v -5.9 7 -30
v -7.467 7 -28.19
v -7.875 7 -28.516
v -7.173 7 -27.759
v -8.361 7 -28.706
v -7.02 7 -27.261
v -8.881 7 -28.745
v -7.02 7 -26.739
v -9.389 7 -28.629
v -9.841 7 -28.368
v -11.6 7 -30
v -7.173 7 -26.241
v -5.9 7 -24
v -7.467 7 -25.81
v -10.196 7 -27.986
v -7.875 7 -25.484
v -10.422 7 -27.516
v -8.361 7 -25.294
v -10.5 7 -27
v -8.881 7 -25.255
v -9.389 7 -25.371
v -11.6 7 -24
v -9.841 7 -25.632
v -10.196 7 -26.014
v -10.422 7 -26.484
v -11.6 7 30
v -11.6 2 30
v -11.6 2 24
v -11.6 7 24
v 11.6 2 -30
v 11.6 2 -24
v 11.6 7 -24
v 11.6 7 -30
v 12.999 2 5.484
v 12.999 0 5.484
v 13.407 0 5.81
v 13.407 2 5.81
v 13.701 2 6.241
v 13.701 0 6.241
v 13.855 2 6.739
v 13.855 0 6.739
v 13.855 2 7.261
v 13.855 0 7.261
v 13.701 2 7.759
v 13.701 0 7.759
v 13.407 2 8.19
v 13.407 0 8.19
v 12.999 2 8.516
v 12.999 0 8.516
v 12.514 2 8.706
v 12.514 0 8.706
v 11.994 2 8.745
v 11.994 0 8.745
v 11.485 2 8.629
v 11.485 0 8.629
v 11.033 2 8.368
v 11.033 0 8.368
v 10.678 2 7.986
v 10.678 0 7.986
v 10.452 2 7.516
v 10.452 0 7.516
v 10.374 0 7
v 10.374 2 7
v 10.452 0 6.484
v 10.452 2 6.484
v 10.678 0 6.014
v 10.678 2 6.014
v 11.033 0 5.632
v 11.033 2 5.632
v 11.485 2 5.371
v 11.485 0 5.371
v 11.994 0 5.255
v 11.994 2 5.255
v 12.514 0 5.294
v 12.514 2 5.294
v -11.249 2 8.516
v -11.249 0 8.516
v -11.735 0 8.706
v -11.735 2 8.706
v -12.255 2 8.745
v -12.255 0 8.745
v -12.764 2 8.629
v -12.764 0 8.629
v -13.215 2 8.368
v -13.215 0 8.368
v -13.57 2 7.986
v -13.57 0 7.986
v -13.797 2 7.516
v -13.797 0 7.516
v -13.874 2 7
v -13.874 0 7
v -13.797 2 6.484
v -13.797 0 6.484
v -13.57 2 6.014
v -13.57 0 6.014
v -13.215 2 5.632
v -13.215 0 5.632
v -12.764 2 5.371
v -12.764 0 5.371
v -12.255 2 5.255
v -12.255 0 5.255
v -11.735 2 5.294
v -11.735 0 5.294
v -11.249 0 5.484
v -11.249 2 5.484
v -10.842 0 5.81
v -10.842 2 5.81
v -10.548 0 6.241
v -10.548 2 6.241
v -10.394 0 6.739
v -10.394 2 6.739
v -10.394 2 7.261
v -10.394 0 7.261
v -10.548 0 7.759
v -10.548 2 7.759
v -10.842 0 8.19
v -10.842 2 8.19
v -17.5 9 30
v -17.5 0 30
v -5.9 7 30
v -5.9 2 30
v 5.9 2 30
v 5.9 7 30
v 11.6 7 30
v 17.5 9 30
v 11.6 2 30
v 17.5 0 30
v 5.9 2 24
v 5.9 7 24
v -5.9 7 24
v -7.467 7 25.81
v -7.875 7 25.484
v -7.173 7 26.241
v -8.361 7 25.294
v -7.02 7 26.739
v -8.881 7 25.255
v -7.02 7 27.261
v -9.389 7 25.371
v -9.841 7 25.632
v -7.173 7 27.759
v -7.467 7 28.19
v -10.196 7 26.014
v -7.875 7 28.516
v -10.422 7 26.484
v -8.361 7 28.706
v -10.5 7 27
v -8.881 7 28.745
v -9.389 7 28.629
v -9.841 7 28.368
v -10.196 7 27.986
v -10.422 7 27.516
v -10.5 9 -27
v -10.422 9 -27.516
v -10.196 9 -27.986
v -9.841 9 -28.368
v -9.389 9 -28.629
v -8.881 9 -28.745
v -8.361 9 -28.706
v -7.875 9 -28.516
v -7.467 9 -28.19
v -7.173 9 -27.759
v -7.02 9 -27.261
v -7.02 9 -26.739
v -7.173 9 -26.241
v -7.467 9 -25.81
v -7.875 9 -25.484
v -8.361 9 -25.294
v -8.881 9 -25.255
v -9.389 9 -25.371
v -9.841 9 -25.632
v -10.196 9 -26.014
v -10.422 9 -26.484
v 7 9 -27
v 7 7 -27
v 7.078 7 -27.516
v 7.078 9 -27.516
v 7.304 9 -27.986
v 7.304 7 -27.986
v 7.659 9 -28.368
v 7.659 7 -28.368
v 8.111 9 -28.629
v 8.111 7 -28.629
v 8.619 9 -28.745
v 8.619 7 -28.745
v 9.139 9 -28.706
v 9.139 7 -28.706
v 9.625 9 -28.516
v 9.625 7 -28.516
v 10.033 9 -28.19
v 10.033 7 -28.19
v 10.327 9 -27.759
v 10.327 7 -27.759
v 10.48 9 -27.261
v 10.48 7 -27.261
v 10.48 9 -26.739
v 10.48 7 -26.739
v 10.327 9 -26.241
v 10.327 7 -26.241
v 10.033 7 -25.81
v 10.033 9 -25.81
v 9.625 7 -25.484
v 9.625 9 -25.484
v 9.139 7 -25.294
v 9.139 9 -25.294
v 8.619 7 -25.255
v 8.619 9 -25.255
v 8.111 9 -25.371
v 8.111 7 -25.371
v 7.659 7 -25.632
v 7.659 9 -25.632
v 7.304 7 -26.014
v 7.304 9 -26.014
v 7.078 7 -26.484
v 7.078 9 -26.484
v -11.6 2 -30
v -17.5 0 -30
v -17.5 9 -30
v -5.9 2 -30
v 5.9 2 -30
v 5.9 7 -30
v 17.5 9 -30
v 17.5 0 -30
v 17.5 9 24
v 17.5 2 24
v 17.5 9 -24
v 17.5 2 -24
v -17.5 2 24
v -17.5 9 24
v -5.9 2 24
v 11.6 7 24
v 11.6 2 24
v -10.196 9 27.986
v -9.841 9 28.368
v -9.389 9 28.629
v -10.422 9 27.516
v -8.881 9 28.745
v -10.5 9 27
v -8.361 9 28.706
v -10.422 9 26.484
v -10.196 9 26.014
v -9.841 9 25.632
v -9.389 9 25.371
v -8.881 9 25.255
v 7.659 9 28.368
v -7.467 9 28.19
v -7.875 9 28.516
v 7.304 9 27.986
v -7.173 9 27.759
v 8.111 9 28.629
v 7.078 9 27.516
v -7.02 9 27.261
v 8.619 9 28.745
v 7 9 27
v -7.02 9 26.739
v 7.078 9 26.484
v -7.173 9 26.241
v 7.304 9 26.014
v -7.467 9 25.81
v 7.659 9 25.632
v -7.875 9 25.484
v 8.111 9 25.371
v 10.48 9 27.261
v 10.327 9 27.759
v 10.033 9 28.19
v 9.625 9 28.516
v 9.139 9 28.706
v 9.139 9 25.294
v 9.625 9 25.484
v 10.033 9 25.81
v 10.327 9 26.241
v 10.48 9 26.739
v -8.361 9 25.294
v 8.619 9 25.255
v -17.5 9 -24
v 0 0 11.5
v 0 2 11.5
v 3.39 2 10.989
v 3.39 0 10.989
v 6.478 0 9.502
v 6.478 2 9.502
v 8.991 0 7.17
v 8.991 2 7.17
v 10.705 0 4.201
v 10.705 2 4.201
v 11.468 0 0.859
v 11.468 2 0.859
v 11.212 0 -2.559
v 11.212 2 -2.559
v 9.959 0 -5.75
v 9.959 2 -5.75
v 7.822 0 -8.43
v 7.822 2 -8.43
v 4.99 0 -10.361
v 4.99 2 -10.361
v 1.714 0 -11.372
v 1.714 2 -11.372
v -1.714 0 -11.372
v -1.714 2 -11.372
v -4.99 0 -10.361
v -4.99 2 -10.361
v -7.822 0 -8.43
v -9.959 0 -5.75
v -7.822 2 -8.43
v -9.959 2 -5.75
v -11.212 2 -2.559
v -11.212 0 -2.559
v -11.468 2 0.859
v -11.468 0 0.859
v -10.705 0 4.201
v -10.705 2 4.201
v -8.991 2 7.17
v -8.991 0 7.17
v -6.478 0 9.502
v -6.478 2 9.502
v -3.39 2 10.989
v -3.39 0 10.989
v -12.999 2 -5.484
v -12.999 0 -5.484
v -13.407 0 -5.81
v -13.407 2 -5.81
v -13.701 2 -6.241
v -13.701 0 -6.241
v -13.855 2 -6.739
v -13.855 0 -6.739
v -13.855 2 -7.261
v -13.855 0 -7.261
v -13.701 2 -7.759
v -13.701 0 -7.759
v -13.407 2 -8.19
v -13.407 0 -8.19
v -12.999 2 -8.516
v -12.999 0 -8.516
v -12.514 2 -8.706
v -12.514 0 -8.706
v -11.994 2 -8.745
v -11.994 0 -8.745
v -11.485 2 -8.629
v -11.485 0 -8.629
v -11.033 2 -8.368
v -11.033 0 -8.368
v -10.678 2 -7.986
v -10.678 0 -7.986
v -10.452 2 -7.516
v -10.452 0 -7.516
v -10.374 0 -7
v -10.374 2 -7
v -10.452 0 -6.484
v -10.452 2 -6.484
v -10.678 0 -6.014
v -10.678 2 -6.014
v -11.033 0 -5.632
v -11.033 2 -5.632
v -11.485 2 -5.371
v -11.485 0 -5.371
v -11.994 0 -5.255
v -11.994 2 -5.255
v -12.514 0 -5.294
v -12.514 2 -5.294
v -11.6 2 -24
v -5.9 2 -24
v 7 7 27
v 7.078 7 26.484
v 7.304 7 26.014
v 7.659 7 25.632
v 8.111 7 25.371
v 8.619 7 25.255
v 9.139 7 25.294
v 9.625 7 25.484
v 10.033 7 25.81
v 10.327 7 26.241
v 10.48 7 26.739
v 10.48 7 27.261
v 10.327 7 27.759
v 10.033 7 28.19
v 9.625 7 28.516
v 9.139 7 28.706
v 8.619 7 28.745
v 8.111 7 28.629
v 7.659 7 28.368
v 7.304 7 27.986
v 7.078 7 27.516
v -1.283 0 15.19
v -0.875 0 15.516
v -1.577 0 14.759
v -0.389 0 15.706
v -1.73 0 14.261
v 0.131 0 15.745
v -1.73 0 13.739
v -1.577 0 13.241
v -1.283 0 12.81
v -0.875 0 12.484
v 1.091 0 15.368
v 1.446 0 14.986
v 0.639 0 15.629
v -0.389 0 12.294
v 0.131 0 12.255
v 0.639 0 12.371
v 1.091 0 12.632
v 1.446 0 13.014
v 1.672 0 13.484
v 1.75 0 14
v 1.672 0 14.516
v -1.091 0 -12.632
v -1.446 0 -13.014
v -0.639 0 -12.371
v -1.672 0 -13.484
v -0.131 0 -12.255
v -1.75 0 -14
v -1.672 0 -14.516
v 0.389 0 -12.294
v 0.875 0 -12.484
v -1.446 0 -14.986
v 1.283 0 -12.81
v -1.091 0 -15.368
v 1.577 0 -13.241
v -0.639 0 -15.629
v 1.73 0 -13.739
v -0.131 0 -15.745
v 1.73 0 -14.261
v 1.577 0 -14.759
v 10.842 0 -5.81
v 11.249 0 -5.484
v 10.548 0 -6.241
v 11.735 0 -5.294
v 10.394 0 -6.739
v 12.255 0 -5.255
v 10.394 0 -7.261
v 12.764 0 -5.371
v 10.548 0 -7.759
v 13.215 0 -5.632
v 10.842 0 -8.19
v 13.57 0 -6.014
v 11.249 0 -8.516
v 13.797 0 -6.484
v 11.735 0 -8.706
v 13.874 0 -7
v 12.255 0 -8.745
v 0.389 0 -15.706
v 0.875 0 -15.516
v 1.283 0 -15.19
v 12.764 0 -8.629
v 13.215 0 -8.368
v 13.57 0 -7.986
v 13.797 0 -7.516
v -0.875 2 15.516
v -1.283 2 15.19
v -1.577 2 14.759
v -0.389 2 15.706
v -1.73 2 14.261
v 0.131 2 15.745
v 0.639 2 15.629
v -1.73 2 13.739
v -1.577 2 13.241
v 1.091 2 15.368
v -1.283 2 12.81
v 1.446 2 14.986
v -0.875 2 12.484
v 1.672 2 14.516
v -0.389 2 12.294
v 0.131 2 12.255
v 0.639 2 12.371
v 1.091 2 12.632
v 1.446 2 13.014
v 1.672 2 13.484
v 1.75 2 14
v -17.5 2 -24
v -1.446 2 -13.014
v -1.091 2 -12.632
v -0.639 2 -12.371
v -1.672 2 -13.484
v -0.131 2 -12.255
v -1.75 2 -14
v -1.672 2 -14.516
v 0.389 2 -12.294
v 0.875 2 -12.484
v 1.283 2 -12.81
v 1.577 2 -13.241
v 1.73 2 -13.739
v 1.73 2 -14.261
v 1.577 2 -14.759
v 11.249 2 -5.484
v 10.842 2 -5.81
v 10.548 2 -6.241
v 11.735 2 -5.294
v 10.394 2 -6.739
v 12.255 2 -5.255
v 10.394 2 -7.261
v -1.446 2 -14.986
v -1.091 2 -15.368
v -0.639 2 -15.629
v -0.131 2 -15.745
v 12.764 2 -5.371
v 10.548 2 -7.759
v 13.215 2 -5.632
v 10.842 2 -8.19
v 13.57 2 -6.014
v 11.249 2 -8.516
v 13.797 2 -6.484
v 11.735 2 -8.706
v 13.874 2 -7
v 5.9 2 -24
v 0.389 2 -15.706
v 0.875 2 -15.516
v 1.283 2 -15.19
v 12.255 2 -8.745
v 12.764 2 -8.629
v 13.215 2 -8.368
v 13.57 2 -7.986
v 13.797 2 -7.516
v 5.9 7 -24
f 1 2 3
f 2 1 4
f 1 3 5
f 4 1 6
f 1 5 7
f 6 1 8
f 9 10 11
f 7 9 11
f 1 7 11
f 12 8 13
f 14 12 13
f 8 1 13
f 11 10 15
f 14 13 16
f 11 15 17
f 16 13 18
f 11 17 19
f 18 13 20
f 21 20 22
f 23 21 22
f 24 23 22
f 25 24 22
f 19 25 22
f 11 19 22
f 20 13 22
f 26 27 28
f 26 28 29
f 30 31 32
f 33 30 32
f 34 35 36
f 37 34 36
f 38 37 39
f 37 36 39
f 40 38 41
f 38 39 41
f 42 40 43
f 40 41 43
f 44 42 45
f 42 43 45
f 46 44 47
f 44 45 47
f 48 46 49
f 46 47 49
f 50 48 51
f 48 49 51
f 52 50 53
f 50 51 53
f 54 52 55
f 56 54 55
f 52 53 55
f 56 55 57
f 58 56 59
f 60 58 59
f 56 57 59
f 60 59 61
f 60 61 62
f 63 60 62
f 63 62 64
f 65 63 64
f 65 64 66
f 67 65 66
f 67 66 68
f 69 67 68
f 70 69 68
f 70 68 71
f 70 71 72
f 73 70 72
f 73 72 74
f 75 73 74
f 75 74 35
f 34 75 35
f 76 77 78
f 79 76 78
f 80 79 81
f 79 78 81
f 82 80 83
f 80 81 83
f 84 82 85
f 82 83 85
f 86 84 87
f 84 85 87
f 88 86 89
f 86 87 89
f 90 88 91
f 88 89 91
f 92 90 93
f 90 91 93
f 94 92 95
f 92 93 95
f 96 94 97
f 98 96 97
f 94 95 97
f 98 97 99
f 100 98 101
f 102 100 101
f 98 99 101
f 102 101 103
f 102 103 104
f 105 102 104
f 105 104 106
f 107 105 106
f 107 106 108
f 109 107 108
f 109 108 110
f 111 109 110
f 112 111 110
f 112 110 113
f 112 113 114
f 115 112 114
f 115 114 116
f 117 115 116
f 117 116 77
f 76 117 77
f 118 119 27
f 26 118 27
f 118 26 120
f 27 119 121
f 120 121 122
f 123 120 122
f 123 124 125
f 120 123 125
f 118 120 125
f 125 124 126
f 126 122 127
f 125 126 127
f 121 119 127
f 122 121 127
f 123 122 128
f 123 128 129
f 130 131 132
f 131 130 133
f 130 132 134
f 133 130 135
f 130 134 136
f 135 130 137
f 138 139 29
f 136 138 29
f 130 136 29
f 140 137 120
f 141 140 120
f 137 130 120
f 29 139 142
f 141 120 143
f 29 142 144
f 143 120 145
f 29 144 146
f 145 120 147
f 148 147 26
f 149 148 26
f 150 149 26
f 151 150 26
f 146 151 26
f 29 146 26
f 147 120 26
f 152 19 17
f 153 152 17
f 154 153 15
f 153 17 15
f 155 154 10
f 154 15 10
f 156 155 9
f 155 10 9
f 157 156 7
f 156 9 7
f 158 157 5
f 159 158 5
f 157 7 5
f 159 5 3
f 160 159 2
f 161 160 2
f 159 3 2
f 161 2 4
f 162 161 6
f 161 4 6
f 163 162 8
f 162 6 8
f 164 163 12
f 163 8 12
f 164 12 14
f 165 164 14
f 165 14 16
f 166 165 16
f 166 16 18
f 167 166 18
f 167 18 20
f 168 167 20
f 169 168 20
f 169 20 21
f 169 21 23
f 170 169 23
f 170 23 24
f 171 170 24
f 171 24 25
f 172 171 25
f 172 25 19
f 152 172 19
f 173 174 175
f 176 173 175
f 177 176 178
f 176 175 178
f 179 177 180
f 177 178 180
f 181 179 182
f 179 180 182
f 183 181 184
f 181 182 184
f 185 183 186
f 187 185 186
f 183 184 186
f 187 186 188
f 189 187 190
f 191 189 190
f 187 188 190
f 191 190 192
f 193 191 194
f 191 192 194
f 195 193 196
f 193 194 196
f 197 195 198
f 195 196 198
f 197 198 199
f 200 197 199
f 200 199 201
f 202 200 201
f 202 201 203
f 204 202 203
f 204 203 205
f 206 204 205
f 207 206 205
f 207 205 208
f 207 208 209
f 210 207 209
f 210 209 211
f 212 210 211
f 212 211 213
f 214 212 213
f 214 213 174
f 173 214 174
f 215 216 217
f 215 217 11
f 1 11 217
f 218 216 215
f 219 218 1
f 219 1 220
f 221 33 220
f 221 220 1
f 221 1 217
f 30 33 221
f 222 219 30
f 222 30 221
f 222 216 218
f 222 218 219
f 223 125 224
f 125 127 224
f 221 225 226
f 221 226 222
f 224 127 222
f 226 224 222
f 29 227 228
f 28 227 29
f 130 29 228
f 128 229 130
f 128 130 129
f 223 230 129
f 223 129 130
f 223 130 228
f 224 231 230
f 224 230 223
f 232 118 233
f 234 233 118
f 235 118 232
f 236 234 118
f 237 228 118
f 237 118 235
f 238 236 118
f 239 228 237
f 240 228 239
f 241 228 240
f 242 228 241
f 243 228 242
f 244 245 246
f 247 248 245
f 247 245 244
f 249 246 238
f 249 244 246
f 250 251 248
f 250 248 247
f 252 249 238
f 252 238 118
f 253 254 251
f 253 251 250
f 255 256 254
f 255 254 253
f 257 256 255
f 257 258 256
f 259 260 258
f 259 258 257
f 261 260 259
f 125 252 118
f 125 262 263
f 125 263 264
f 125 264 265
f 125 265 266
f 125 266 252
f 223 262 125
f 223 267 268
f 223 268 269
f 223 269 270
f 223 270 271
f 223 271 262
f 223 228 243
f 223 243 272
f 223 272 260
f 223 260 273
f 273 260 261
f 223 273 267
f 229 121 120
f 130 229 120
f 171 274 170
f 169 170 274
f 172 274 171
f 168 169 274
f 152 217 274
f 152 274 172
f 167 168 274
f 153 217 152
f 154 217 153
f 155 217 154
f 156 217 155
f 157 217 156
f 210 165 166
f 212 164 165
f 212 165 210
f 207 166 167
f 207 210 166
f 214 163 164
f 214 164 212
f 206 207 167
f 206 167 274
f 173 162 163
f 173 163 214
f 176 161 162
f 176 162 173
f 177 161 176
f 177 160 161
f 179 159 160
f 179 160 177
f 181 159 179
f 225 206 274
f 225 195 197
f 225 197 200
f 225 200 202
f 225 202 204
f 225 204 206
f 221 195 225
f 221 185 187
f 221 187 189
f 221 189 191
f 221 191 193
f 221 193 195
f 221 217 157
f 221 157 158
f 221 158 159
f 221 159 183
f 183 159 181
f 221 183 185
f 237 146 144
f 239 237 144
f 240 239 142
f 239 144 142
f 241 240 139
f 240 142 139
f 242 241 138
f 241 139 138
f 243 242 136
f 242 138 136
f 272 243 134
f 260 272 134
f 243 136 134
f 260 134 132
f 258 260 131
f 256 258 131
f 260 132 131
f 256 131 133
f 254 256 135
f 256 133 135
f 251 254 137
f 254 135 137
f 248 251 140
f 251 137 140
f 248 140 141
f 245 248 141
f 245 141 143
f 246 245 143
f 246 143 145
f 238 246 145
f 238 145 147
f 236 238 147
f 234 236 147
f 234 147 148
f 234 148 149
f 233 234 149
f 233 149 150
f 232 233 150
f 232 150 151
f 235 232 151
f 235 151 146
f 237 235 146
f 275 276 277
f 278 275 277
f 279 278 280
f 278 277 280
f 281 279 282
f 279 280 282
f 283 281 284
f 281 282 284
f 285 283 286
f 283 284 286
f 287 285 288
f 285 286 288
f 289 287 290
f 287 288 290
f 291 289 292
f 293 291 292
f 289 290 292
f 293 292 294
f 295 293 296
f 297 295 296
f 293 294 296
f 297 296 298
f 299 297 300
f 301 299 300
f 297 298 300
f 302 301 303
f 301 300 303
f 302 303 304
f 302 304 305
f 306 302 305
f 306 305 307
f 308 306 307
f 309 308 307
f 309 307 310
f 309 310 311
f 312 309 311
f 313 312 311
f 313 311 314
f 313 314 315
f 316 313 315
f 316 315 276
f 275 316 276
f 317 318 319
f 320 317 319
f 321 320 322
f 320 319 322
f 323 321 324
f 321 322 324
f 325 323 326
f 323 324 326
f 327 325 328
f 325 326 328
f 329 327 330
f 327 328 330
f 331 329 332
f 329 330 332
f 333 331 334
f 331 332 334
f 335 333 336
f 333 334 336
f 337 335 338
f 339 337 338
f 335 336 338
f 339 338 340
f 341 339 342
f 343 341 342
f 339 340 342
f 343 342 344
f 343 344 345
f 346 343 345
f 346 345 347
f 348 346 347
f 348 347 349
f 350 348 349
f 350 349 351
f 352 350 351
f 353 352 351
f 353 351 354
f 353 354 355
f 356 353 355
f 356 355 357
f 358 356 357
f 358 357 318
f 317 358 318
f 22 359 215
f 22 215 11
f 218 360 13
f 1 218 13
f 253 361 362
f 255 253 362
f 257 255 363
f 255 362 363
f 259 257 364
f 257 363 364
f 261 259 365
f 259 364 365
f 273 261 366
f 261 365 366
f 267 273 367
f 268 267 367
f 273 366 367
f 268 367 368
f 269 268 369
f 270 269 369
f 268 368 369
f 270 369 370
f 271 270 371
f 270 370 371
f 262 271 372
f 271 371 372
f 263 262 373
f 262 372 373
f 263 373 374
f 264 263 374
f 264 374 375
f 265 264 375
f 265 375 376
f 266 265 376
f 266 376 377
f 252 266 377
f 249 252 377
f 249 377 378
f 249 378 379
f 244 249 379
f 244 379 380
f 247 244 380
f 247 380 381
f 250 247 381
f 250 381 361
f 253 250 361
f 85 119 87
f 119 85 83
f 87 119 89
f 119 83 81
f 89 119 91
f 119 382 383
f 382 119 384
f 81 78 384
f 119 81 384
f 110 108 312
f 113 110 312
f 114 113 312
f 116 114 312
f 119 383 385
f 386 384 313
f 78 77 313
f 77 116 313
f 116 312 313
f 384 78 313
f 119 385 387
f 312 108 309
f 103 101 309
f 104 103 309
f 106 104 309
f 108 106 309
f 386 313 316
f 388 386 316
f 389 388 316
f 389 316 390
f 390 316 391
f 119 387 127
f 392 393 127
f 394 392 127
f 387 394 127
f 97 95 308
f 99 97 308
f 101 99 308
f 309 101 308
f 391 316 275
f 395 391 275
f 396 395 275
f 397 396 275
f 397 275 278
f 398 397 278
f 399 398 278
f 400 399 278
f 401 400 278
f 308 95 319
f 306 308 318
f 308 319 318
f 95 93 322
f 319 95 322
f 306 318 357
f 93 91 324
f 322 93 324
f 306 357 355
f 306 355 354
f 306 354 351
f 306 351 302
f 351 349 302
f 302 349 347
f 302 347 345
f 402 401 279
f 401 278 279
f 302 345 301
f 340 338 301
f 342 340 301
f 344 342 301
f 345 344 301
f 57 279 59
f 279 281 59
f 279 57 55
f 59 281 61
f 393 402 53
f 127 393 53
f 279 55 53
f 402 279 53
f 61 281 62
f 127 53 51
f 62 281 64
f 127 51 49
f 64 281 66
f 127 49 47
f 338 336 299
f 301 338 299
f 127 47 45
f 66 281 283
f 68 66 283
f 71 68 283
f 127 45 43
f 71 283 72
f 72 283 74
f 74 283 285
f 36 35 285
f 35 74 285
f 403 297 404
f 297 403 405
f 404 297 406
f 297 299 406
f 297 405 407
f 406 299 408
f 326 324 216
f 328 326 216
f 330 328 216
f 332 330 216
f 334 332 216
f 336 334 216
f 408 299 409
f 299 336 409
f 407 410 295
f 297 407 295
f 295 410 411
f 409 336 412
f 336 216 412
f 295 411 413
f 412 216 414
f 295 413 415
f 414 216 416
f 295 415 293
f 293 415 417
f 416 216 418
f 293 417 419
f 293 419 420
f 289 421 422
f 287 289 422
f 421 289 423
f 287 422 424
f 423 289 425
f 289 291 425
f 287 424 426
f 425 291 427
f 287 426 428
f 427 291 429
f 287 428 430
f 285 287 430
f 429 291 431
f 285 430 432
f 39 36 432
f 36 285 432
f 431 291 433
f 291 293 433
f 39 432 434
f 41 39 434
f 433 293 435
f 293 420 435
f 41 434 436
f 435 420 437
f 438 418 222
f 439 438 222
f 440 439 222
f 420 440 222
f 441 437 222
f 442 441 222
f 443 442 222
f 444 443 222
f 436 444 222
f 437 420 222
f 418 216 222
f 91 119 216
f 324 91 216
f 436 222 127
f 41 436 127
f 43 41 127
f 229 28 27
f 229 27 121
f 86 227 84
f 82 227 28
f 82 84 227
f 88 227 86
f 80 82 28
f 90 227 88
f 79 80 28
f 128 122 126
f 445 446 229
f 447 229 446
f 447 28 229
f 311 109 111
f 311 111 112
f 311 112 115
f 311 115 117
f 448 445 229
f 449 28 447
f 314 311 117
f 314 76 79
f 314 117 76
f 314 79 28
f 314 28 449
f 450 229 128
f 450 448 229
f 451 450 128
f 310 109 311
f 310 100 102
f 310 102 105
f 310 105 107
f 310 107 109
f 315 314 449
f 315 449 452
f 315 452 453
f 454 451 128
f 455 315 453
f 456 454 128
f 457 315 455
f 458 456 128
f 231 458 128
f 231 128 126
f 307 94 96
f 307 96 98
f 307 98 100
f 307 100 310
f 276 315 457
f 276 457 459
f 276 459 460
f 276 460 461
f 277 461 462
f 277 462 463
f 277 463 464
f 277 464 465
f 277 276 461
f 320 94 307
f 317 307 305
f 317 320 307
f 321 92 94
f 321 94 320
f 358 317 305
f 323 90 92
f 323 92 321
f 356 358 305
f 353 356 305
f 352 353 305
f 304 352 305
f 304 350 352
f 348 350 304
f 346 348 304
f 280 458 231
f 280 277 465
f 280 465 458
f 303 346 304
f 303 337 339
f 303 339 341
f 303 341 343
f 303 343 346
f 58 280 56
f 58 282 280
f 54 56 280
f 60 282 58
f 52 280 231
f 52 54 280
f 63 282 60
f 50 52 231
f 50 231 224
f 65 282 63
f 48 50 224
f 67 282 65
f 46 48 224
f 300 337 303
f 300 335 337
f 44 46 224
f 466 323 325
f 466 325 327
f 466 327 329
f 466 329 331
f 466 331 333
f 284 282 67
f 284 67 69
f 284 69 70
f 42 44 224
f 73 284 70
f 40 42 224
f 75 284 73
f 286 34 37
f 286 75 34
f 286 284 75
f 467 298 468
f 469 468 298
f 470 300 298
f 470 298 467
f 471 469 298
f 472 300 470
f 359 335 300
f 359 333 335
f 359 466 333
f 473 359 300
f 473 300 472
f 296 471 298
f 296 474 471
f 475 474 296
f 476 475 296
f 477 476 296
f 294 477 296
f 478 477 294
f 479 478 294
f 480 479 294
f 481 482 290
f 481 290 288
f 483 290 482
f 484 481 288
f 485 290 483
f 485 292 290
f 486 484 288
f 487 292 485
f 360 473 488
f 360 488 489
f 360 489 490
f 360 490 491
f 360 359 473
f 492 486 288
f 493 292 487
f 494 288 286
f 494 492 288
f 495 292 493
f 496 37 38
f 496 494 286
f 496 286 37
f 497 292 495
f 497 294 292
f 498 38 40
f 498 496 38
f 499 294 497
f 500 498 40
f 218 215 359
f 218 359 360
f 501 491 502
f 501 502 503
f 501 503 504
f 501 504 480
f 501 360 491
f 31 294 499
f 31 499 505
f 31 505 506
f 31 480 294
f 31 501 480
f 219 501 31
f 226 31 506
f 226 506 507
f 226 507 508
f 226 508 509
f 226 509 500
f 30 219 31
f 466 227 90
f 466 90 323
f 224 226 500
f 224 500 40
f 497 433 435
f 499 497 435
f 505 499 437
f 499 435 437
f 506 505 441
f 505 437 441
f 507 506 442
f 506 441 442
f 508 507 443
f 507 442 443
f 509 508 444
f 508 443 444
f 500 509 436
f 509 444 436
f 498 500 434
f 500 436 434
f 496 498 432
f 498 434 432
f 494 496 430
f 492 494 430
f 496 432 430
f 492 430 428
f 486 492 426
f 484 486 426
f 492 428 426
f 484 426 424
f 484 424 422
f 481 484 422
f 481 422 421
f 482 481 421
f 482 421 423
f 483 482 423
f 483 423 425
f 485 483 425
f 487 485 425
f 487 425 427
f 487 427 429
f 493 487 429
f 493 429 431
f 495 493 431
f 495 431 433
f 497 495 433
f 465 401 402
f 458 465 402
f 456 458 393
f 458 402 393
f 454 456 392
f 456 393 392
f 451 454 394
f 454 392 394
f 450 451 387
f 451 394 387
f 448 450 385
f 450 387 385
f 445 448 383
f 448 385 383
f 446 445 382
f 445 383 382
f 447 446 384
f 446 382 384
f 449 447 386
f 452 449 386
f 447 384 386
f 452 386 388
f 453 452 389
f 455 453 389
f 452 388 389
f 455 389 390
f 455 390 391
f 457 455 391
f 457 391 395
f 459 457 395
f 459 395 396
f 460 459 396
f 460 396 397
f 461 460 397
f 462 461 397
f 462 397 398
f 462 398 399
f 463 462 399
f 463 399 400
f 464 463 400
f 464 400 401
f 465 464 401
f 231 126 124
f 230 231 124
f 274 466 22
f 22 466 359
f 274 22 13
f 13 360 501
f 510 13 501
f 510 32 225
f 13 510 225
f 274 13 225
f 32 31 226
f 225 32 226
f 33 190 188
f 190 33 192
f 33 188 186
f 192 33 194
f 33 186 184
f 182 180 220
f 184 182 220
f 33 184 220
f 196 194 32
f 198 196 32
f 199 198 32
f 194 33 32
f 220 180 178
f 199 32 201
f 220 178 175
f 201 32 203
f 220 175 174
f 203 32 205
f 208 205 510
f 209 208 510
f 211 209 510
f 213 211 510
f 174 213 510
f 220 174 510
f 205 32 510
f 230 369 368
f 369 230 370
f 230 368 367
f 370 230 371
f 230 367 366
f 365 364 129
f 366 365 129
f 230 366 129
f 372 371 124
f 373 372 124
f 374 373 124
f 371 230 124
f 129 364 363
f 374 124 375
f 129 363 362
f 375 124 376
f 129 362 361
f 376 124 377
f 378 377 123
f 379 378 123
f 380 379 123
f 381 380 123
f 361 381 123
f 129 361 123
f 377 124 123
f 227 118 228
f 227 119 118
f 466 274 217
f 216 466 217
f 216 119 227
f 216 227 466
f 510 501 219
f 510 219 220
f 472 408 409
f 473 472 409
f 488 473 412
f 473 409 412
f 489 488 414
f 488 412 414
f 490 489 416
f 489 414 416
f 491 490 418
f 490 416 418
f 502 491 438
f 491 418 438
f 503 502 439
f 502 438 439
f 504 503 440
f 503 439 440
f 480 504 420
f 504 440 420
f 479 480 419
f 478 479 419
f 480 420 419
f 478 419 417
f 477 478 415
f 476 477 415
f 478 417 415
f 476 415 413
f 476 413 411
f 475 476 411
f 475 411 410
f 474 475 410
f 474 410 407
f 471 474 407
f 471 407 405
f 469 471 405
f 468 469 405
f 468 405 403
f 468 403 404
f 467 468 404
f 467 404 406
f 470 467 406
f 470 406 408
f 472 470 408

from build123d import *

# Parameters (mm, degrees)
SKETCH_1_W               = 35
SKETCH_1_H               = 60
EXTRUDE_1_DEPTH          = 2
HOLE_WIZARD_1_D          = 3.5
PATTERN_CIRCULAR_1_COUNT = 6
SKETCH_5_R               = 11.5
CUT_EXTRUDE_1_DEPTH      = 2
SKETCH_11_W              = 35
SKETCH_11_H              = 6
EXTRUDE_2_DEPTH          = 7
SKETCH_12_W              = 2.85
SKETCH_12_H              = 5
CUT_EXTRUDE_3_DEPTH      = 64.144675152
HOLE_WIZARD_2_D          = 3.5
HOLE_WIZARD_2_DEPTH      = 2


with BuildPart() as part:
    # 草图1 → 凸台-拉伸1 (new body)
    with BuildSketch(Plane(origin=(0, 0, 0), x_dir=(1, 0, 0), z_dir=(0, 1, 0))):
        Rectangle(SKETCH_1_W, SKETCH_1_H)
    extrude(amount=EXTRUDE_1_DEPTH)

    # 孔1 (through all)
    with Locations(Plane(origin=(0, 2, 0), x_dir=(1, 0, 0), z_dir=(0, 1, 0))):
        with Locations((0, 14)):
            hole_wizard_1 = Hole(HOLE_WIZARD_1_D / 2)

    # 阵列(圆周)1: 孔1 ×6 about axis
    pattern_circular_1_axis = Axis((0, 0, 0), (0, 1, 0))
    for i in range(1, PATTERN_CIRCULAR_1_COUNT):
        add(hole_wizard_1.rotate(pattern_circular_1_axis, i * 360 / PATTERN_CIRCULAR_1_COUNT), mode=Mode.SUBTRACT)

    # 草图5 → 切除-拉伸1 (cut)
    with BuildSketch(Plane(origin=(0, 2, 0), x_dir=(1, 0, 0), z_dir=(0, 1, 0))):
        with Locations(Location((0, 0, 0), (0, 0, 270))):
            Circle(SKETCH_5_R)
    extrude(amount=-CUT_EXTRUDE_1_DEPTH, mode=Mode.SUBTRACT)

    # 草图11 → 凸台-拉伸2 (add)
    with BuildSketch(Plane(origin=(0, 2, 0), x_dir=(1, 0, 0), z_dir=(0, 1, 0))):
        with Locations((0, -27)):
            Rectangle(SKETCH_11_W, SKETCH_11_H)
        with Locations((0, 27)):
            Rectangle(SKETCH_11_W, SKETCH_11_H)
    extrude(amount=EXTRUDE_2_DEPTH)

    # 草图12 → 切除-拉伸3 (cut, through all)
    with BuildSketch(Plane.XY.offset(30)):
        with Locations((-10.175, 4.5)):
            Rectangle(SKETCH_12_W, SKETCH_12_H)
        with Locations((-7.325, 4.5)):
            Rectangle(SKETCH_12_W, SKETCH_12_H)
        with Locations((10.175, 4.5)):
            Rectangle(SKETCH_12_W, SKETCH_12_H)
        with Locations((7.325, 4.5)):
            Rectangle(SKETCH_12_W, SKETCH_12_H)
    extrude(amount=-CUT_EXTRUDE_3_DEPTH, mode=Mode.SUBTRACT)

    # 孔2
    with Locations(Plane(origin=(0, 9, 0), x_dir=(1, 0, 0), z_dir=(0, 1, 0))):
        with Locations((-8.75, 27), (8.75, 27), (-8.75, -27), (8.75, -27)):
            Hole(HOLE_WIZARD_2_D / 2, depth=HOLE_WIZARD_2_DEPTH)


solid = part.part
